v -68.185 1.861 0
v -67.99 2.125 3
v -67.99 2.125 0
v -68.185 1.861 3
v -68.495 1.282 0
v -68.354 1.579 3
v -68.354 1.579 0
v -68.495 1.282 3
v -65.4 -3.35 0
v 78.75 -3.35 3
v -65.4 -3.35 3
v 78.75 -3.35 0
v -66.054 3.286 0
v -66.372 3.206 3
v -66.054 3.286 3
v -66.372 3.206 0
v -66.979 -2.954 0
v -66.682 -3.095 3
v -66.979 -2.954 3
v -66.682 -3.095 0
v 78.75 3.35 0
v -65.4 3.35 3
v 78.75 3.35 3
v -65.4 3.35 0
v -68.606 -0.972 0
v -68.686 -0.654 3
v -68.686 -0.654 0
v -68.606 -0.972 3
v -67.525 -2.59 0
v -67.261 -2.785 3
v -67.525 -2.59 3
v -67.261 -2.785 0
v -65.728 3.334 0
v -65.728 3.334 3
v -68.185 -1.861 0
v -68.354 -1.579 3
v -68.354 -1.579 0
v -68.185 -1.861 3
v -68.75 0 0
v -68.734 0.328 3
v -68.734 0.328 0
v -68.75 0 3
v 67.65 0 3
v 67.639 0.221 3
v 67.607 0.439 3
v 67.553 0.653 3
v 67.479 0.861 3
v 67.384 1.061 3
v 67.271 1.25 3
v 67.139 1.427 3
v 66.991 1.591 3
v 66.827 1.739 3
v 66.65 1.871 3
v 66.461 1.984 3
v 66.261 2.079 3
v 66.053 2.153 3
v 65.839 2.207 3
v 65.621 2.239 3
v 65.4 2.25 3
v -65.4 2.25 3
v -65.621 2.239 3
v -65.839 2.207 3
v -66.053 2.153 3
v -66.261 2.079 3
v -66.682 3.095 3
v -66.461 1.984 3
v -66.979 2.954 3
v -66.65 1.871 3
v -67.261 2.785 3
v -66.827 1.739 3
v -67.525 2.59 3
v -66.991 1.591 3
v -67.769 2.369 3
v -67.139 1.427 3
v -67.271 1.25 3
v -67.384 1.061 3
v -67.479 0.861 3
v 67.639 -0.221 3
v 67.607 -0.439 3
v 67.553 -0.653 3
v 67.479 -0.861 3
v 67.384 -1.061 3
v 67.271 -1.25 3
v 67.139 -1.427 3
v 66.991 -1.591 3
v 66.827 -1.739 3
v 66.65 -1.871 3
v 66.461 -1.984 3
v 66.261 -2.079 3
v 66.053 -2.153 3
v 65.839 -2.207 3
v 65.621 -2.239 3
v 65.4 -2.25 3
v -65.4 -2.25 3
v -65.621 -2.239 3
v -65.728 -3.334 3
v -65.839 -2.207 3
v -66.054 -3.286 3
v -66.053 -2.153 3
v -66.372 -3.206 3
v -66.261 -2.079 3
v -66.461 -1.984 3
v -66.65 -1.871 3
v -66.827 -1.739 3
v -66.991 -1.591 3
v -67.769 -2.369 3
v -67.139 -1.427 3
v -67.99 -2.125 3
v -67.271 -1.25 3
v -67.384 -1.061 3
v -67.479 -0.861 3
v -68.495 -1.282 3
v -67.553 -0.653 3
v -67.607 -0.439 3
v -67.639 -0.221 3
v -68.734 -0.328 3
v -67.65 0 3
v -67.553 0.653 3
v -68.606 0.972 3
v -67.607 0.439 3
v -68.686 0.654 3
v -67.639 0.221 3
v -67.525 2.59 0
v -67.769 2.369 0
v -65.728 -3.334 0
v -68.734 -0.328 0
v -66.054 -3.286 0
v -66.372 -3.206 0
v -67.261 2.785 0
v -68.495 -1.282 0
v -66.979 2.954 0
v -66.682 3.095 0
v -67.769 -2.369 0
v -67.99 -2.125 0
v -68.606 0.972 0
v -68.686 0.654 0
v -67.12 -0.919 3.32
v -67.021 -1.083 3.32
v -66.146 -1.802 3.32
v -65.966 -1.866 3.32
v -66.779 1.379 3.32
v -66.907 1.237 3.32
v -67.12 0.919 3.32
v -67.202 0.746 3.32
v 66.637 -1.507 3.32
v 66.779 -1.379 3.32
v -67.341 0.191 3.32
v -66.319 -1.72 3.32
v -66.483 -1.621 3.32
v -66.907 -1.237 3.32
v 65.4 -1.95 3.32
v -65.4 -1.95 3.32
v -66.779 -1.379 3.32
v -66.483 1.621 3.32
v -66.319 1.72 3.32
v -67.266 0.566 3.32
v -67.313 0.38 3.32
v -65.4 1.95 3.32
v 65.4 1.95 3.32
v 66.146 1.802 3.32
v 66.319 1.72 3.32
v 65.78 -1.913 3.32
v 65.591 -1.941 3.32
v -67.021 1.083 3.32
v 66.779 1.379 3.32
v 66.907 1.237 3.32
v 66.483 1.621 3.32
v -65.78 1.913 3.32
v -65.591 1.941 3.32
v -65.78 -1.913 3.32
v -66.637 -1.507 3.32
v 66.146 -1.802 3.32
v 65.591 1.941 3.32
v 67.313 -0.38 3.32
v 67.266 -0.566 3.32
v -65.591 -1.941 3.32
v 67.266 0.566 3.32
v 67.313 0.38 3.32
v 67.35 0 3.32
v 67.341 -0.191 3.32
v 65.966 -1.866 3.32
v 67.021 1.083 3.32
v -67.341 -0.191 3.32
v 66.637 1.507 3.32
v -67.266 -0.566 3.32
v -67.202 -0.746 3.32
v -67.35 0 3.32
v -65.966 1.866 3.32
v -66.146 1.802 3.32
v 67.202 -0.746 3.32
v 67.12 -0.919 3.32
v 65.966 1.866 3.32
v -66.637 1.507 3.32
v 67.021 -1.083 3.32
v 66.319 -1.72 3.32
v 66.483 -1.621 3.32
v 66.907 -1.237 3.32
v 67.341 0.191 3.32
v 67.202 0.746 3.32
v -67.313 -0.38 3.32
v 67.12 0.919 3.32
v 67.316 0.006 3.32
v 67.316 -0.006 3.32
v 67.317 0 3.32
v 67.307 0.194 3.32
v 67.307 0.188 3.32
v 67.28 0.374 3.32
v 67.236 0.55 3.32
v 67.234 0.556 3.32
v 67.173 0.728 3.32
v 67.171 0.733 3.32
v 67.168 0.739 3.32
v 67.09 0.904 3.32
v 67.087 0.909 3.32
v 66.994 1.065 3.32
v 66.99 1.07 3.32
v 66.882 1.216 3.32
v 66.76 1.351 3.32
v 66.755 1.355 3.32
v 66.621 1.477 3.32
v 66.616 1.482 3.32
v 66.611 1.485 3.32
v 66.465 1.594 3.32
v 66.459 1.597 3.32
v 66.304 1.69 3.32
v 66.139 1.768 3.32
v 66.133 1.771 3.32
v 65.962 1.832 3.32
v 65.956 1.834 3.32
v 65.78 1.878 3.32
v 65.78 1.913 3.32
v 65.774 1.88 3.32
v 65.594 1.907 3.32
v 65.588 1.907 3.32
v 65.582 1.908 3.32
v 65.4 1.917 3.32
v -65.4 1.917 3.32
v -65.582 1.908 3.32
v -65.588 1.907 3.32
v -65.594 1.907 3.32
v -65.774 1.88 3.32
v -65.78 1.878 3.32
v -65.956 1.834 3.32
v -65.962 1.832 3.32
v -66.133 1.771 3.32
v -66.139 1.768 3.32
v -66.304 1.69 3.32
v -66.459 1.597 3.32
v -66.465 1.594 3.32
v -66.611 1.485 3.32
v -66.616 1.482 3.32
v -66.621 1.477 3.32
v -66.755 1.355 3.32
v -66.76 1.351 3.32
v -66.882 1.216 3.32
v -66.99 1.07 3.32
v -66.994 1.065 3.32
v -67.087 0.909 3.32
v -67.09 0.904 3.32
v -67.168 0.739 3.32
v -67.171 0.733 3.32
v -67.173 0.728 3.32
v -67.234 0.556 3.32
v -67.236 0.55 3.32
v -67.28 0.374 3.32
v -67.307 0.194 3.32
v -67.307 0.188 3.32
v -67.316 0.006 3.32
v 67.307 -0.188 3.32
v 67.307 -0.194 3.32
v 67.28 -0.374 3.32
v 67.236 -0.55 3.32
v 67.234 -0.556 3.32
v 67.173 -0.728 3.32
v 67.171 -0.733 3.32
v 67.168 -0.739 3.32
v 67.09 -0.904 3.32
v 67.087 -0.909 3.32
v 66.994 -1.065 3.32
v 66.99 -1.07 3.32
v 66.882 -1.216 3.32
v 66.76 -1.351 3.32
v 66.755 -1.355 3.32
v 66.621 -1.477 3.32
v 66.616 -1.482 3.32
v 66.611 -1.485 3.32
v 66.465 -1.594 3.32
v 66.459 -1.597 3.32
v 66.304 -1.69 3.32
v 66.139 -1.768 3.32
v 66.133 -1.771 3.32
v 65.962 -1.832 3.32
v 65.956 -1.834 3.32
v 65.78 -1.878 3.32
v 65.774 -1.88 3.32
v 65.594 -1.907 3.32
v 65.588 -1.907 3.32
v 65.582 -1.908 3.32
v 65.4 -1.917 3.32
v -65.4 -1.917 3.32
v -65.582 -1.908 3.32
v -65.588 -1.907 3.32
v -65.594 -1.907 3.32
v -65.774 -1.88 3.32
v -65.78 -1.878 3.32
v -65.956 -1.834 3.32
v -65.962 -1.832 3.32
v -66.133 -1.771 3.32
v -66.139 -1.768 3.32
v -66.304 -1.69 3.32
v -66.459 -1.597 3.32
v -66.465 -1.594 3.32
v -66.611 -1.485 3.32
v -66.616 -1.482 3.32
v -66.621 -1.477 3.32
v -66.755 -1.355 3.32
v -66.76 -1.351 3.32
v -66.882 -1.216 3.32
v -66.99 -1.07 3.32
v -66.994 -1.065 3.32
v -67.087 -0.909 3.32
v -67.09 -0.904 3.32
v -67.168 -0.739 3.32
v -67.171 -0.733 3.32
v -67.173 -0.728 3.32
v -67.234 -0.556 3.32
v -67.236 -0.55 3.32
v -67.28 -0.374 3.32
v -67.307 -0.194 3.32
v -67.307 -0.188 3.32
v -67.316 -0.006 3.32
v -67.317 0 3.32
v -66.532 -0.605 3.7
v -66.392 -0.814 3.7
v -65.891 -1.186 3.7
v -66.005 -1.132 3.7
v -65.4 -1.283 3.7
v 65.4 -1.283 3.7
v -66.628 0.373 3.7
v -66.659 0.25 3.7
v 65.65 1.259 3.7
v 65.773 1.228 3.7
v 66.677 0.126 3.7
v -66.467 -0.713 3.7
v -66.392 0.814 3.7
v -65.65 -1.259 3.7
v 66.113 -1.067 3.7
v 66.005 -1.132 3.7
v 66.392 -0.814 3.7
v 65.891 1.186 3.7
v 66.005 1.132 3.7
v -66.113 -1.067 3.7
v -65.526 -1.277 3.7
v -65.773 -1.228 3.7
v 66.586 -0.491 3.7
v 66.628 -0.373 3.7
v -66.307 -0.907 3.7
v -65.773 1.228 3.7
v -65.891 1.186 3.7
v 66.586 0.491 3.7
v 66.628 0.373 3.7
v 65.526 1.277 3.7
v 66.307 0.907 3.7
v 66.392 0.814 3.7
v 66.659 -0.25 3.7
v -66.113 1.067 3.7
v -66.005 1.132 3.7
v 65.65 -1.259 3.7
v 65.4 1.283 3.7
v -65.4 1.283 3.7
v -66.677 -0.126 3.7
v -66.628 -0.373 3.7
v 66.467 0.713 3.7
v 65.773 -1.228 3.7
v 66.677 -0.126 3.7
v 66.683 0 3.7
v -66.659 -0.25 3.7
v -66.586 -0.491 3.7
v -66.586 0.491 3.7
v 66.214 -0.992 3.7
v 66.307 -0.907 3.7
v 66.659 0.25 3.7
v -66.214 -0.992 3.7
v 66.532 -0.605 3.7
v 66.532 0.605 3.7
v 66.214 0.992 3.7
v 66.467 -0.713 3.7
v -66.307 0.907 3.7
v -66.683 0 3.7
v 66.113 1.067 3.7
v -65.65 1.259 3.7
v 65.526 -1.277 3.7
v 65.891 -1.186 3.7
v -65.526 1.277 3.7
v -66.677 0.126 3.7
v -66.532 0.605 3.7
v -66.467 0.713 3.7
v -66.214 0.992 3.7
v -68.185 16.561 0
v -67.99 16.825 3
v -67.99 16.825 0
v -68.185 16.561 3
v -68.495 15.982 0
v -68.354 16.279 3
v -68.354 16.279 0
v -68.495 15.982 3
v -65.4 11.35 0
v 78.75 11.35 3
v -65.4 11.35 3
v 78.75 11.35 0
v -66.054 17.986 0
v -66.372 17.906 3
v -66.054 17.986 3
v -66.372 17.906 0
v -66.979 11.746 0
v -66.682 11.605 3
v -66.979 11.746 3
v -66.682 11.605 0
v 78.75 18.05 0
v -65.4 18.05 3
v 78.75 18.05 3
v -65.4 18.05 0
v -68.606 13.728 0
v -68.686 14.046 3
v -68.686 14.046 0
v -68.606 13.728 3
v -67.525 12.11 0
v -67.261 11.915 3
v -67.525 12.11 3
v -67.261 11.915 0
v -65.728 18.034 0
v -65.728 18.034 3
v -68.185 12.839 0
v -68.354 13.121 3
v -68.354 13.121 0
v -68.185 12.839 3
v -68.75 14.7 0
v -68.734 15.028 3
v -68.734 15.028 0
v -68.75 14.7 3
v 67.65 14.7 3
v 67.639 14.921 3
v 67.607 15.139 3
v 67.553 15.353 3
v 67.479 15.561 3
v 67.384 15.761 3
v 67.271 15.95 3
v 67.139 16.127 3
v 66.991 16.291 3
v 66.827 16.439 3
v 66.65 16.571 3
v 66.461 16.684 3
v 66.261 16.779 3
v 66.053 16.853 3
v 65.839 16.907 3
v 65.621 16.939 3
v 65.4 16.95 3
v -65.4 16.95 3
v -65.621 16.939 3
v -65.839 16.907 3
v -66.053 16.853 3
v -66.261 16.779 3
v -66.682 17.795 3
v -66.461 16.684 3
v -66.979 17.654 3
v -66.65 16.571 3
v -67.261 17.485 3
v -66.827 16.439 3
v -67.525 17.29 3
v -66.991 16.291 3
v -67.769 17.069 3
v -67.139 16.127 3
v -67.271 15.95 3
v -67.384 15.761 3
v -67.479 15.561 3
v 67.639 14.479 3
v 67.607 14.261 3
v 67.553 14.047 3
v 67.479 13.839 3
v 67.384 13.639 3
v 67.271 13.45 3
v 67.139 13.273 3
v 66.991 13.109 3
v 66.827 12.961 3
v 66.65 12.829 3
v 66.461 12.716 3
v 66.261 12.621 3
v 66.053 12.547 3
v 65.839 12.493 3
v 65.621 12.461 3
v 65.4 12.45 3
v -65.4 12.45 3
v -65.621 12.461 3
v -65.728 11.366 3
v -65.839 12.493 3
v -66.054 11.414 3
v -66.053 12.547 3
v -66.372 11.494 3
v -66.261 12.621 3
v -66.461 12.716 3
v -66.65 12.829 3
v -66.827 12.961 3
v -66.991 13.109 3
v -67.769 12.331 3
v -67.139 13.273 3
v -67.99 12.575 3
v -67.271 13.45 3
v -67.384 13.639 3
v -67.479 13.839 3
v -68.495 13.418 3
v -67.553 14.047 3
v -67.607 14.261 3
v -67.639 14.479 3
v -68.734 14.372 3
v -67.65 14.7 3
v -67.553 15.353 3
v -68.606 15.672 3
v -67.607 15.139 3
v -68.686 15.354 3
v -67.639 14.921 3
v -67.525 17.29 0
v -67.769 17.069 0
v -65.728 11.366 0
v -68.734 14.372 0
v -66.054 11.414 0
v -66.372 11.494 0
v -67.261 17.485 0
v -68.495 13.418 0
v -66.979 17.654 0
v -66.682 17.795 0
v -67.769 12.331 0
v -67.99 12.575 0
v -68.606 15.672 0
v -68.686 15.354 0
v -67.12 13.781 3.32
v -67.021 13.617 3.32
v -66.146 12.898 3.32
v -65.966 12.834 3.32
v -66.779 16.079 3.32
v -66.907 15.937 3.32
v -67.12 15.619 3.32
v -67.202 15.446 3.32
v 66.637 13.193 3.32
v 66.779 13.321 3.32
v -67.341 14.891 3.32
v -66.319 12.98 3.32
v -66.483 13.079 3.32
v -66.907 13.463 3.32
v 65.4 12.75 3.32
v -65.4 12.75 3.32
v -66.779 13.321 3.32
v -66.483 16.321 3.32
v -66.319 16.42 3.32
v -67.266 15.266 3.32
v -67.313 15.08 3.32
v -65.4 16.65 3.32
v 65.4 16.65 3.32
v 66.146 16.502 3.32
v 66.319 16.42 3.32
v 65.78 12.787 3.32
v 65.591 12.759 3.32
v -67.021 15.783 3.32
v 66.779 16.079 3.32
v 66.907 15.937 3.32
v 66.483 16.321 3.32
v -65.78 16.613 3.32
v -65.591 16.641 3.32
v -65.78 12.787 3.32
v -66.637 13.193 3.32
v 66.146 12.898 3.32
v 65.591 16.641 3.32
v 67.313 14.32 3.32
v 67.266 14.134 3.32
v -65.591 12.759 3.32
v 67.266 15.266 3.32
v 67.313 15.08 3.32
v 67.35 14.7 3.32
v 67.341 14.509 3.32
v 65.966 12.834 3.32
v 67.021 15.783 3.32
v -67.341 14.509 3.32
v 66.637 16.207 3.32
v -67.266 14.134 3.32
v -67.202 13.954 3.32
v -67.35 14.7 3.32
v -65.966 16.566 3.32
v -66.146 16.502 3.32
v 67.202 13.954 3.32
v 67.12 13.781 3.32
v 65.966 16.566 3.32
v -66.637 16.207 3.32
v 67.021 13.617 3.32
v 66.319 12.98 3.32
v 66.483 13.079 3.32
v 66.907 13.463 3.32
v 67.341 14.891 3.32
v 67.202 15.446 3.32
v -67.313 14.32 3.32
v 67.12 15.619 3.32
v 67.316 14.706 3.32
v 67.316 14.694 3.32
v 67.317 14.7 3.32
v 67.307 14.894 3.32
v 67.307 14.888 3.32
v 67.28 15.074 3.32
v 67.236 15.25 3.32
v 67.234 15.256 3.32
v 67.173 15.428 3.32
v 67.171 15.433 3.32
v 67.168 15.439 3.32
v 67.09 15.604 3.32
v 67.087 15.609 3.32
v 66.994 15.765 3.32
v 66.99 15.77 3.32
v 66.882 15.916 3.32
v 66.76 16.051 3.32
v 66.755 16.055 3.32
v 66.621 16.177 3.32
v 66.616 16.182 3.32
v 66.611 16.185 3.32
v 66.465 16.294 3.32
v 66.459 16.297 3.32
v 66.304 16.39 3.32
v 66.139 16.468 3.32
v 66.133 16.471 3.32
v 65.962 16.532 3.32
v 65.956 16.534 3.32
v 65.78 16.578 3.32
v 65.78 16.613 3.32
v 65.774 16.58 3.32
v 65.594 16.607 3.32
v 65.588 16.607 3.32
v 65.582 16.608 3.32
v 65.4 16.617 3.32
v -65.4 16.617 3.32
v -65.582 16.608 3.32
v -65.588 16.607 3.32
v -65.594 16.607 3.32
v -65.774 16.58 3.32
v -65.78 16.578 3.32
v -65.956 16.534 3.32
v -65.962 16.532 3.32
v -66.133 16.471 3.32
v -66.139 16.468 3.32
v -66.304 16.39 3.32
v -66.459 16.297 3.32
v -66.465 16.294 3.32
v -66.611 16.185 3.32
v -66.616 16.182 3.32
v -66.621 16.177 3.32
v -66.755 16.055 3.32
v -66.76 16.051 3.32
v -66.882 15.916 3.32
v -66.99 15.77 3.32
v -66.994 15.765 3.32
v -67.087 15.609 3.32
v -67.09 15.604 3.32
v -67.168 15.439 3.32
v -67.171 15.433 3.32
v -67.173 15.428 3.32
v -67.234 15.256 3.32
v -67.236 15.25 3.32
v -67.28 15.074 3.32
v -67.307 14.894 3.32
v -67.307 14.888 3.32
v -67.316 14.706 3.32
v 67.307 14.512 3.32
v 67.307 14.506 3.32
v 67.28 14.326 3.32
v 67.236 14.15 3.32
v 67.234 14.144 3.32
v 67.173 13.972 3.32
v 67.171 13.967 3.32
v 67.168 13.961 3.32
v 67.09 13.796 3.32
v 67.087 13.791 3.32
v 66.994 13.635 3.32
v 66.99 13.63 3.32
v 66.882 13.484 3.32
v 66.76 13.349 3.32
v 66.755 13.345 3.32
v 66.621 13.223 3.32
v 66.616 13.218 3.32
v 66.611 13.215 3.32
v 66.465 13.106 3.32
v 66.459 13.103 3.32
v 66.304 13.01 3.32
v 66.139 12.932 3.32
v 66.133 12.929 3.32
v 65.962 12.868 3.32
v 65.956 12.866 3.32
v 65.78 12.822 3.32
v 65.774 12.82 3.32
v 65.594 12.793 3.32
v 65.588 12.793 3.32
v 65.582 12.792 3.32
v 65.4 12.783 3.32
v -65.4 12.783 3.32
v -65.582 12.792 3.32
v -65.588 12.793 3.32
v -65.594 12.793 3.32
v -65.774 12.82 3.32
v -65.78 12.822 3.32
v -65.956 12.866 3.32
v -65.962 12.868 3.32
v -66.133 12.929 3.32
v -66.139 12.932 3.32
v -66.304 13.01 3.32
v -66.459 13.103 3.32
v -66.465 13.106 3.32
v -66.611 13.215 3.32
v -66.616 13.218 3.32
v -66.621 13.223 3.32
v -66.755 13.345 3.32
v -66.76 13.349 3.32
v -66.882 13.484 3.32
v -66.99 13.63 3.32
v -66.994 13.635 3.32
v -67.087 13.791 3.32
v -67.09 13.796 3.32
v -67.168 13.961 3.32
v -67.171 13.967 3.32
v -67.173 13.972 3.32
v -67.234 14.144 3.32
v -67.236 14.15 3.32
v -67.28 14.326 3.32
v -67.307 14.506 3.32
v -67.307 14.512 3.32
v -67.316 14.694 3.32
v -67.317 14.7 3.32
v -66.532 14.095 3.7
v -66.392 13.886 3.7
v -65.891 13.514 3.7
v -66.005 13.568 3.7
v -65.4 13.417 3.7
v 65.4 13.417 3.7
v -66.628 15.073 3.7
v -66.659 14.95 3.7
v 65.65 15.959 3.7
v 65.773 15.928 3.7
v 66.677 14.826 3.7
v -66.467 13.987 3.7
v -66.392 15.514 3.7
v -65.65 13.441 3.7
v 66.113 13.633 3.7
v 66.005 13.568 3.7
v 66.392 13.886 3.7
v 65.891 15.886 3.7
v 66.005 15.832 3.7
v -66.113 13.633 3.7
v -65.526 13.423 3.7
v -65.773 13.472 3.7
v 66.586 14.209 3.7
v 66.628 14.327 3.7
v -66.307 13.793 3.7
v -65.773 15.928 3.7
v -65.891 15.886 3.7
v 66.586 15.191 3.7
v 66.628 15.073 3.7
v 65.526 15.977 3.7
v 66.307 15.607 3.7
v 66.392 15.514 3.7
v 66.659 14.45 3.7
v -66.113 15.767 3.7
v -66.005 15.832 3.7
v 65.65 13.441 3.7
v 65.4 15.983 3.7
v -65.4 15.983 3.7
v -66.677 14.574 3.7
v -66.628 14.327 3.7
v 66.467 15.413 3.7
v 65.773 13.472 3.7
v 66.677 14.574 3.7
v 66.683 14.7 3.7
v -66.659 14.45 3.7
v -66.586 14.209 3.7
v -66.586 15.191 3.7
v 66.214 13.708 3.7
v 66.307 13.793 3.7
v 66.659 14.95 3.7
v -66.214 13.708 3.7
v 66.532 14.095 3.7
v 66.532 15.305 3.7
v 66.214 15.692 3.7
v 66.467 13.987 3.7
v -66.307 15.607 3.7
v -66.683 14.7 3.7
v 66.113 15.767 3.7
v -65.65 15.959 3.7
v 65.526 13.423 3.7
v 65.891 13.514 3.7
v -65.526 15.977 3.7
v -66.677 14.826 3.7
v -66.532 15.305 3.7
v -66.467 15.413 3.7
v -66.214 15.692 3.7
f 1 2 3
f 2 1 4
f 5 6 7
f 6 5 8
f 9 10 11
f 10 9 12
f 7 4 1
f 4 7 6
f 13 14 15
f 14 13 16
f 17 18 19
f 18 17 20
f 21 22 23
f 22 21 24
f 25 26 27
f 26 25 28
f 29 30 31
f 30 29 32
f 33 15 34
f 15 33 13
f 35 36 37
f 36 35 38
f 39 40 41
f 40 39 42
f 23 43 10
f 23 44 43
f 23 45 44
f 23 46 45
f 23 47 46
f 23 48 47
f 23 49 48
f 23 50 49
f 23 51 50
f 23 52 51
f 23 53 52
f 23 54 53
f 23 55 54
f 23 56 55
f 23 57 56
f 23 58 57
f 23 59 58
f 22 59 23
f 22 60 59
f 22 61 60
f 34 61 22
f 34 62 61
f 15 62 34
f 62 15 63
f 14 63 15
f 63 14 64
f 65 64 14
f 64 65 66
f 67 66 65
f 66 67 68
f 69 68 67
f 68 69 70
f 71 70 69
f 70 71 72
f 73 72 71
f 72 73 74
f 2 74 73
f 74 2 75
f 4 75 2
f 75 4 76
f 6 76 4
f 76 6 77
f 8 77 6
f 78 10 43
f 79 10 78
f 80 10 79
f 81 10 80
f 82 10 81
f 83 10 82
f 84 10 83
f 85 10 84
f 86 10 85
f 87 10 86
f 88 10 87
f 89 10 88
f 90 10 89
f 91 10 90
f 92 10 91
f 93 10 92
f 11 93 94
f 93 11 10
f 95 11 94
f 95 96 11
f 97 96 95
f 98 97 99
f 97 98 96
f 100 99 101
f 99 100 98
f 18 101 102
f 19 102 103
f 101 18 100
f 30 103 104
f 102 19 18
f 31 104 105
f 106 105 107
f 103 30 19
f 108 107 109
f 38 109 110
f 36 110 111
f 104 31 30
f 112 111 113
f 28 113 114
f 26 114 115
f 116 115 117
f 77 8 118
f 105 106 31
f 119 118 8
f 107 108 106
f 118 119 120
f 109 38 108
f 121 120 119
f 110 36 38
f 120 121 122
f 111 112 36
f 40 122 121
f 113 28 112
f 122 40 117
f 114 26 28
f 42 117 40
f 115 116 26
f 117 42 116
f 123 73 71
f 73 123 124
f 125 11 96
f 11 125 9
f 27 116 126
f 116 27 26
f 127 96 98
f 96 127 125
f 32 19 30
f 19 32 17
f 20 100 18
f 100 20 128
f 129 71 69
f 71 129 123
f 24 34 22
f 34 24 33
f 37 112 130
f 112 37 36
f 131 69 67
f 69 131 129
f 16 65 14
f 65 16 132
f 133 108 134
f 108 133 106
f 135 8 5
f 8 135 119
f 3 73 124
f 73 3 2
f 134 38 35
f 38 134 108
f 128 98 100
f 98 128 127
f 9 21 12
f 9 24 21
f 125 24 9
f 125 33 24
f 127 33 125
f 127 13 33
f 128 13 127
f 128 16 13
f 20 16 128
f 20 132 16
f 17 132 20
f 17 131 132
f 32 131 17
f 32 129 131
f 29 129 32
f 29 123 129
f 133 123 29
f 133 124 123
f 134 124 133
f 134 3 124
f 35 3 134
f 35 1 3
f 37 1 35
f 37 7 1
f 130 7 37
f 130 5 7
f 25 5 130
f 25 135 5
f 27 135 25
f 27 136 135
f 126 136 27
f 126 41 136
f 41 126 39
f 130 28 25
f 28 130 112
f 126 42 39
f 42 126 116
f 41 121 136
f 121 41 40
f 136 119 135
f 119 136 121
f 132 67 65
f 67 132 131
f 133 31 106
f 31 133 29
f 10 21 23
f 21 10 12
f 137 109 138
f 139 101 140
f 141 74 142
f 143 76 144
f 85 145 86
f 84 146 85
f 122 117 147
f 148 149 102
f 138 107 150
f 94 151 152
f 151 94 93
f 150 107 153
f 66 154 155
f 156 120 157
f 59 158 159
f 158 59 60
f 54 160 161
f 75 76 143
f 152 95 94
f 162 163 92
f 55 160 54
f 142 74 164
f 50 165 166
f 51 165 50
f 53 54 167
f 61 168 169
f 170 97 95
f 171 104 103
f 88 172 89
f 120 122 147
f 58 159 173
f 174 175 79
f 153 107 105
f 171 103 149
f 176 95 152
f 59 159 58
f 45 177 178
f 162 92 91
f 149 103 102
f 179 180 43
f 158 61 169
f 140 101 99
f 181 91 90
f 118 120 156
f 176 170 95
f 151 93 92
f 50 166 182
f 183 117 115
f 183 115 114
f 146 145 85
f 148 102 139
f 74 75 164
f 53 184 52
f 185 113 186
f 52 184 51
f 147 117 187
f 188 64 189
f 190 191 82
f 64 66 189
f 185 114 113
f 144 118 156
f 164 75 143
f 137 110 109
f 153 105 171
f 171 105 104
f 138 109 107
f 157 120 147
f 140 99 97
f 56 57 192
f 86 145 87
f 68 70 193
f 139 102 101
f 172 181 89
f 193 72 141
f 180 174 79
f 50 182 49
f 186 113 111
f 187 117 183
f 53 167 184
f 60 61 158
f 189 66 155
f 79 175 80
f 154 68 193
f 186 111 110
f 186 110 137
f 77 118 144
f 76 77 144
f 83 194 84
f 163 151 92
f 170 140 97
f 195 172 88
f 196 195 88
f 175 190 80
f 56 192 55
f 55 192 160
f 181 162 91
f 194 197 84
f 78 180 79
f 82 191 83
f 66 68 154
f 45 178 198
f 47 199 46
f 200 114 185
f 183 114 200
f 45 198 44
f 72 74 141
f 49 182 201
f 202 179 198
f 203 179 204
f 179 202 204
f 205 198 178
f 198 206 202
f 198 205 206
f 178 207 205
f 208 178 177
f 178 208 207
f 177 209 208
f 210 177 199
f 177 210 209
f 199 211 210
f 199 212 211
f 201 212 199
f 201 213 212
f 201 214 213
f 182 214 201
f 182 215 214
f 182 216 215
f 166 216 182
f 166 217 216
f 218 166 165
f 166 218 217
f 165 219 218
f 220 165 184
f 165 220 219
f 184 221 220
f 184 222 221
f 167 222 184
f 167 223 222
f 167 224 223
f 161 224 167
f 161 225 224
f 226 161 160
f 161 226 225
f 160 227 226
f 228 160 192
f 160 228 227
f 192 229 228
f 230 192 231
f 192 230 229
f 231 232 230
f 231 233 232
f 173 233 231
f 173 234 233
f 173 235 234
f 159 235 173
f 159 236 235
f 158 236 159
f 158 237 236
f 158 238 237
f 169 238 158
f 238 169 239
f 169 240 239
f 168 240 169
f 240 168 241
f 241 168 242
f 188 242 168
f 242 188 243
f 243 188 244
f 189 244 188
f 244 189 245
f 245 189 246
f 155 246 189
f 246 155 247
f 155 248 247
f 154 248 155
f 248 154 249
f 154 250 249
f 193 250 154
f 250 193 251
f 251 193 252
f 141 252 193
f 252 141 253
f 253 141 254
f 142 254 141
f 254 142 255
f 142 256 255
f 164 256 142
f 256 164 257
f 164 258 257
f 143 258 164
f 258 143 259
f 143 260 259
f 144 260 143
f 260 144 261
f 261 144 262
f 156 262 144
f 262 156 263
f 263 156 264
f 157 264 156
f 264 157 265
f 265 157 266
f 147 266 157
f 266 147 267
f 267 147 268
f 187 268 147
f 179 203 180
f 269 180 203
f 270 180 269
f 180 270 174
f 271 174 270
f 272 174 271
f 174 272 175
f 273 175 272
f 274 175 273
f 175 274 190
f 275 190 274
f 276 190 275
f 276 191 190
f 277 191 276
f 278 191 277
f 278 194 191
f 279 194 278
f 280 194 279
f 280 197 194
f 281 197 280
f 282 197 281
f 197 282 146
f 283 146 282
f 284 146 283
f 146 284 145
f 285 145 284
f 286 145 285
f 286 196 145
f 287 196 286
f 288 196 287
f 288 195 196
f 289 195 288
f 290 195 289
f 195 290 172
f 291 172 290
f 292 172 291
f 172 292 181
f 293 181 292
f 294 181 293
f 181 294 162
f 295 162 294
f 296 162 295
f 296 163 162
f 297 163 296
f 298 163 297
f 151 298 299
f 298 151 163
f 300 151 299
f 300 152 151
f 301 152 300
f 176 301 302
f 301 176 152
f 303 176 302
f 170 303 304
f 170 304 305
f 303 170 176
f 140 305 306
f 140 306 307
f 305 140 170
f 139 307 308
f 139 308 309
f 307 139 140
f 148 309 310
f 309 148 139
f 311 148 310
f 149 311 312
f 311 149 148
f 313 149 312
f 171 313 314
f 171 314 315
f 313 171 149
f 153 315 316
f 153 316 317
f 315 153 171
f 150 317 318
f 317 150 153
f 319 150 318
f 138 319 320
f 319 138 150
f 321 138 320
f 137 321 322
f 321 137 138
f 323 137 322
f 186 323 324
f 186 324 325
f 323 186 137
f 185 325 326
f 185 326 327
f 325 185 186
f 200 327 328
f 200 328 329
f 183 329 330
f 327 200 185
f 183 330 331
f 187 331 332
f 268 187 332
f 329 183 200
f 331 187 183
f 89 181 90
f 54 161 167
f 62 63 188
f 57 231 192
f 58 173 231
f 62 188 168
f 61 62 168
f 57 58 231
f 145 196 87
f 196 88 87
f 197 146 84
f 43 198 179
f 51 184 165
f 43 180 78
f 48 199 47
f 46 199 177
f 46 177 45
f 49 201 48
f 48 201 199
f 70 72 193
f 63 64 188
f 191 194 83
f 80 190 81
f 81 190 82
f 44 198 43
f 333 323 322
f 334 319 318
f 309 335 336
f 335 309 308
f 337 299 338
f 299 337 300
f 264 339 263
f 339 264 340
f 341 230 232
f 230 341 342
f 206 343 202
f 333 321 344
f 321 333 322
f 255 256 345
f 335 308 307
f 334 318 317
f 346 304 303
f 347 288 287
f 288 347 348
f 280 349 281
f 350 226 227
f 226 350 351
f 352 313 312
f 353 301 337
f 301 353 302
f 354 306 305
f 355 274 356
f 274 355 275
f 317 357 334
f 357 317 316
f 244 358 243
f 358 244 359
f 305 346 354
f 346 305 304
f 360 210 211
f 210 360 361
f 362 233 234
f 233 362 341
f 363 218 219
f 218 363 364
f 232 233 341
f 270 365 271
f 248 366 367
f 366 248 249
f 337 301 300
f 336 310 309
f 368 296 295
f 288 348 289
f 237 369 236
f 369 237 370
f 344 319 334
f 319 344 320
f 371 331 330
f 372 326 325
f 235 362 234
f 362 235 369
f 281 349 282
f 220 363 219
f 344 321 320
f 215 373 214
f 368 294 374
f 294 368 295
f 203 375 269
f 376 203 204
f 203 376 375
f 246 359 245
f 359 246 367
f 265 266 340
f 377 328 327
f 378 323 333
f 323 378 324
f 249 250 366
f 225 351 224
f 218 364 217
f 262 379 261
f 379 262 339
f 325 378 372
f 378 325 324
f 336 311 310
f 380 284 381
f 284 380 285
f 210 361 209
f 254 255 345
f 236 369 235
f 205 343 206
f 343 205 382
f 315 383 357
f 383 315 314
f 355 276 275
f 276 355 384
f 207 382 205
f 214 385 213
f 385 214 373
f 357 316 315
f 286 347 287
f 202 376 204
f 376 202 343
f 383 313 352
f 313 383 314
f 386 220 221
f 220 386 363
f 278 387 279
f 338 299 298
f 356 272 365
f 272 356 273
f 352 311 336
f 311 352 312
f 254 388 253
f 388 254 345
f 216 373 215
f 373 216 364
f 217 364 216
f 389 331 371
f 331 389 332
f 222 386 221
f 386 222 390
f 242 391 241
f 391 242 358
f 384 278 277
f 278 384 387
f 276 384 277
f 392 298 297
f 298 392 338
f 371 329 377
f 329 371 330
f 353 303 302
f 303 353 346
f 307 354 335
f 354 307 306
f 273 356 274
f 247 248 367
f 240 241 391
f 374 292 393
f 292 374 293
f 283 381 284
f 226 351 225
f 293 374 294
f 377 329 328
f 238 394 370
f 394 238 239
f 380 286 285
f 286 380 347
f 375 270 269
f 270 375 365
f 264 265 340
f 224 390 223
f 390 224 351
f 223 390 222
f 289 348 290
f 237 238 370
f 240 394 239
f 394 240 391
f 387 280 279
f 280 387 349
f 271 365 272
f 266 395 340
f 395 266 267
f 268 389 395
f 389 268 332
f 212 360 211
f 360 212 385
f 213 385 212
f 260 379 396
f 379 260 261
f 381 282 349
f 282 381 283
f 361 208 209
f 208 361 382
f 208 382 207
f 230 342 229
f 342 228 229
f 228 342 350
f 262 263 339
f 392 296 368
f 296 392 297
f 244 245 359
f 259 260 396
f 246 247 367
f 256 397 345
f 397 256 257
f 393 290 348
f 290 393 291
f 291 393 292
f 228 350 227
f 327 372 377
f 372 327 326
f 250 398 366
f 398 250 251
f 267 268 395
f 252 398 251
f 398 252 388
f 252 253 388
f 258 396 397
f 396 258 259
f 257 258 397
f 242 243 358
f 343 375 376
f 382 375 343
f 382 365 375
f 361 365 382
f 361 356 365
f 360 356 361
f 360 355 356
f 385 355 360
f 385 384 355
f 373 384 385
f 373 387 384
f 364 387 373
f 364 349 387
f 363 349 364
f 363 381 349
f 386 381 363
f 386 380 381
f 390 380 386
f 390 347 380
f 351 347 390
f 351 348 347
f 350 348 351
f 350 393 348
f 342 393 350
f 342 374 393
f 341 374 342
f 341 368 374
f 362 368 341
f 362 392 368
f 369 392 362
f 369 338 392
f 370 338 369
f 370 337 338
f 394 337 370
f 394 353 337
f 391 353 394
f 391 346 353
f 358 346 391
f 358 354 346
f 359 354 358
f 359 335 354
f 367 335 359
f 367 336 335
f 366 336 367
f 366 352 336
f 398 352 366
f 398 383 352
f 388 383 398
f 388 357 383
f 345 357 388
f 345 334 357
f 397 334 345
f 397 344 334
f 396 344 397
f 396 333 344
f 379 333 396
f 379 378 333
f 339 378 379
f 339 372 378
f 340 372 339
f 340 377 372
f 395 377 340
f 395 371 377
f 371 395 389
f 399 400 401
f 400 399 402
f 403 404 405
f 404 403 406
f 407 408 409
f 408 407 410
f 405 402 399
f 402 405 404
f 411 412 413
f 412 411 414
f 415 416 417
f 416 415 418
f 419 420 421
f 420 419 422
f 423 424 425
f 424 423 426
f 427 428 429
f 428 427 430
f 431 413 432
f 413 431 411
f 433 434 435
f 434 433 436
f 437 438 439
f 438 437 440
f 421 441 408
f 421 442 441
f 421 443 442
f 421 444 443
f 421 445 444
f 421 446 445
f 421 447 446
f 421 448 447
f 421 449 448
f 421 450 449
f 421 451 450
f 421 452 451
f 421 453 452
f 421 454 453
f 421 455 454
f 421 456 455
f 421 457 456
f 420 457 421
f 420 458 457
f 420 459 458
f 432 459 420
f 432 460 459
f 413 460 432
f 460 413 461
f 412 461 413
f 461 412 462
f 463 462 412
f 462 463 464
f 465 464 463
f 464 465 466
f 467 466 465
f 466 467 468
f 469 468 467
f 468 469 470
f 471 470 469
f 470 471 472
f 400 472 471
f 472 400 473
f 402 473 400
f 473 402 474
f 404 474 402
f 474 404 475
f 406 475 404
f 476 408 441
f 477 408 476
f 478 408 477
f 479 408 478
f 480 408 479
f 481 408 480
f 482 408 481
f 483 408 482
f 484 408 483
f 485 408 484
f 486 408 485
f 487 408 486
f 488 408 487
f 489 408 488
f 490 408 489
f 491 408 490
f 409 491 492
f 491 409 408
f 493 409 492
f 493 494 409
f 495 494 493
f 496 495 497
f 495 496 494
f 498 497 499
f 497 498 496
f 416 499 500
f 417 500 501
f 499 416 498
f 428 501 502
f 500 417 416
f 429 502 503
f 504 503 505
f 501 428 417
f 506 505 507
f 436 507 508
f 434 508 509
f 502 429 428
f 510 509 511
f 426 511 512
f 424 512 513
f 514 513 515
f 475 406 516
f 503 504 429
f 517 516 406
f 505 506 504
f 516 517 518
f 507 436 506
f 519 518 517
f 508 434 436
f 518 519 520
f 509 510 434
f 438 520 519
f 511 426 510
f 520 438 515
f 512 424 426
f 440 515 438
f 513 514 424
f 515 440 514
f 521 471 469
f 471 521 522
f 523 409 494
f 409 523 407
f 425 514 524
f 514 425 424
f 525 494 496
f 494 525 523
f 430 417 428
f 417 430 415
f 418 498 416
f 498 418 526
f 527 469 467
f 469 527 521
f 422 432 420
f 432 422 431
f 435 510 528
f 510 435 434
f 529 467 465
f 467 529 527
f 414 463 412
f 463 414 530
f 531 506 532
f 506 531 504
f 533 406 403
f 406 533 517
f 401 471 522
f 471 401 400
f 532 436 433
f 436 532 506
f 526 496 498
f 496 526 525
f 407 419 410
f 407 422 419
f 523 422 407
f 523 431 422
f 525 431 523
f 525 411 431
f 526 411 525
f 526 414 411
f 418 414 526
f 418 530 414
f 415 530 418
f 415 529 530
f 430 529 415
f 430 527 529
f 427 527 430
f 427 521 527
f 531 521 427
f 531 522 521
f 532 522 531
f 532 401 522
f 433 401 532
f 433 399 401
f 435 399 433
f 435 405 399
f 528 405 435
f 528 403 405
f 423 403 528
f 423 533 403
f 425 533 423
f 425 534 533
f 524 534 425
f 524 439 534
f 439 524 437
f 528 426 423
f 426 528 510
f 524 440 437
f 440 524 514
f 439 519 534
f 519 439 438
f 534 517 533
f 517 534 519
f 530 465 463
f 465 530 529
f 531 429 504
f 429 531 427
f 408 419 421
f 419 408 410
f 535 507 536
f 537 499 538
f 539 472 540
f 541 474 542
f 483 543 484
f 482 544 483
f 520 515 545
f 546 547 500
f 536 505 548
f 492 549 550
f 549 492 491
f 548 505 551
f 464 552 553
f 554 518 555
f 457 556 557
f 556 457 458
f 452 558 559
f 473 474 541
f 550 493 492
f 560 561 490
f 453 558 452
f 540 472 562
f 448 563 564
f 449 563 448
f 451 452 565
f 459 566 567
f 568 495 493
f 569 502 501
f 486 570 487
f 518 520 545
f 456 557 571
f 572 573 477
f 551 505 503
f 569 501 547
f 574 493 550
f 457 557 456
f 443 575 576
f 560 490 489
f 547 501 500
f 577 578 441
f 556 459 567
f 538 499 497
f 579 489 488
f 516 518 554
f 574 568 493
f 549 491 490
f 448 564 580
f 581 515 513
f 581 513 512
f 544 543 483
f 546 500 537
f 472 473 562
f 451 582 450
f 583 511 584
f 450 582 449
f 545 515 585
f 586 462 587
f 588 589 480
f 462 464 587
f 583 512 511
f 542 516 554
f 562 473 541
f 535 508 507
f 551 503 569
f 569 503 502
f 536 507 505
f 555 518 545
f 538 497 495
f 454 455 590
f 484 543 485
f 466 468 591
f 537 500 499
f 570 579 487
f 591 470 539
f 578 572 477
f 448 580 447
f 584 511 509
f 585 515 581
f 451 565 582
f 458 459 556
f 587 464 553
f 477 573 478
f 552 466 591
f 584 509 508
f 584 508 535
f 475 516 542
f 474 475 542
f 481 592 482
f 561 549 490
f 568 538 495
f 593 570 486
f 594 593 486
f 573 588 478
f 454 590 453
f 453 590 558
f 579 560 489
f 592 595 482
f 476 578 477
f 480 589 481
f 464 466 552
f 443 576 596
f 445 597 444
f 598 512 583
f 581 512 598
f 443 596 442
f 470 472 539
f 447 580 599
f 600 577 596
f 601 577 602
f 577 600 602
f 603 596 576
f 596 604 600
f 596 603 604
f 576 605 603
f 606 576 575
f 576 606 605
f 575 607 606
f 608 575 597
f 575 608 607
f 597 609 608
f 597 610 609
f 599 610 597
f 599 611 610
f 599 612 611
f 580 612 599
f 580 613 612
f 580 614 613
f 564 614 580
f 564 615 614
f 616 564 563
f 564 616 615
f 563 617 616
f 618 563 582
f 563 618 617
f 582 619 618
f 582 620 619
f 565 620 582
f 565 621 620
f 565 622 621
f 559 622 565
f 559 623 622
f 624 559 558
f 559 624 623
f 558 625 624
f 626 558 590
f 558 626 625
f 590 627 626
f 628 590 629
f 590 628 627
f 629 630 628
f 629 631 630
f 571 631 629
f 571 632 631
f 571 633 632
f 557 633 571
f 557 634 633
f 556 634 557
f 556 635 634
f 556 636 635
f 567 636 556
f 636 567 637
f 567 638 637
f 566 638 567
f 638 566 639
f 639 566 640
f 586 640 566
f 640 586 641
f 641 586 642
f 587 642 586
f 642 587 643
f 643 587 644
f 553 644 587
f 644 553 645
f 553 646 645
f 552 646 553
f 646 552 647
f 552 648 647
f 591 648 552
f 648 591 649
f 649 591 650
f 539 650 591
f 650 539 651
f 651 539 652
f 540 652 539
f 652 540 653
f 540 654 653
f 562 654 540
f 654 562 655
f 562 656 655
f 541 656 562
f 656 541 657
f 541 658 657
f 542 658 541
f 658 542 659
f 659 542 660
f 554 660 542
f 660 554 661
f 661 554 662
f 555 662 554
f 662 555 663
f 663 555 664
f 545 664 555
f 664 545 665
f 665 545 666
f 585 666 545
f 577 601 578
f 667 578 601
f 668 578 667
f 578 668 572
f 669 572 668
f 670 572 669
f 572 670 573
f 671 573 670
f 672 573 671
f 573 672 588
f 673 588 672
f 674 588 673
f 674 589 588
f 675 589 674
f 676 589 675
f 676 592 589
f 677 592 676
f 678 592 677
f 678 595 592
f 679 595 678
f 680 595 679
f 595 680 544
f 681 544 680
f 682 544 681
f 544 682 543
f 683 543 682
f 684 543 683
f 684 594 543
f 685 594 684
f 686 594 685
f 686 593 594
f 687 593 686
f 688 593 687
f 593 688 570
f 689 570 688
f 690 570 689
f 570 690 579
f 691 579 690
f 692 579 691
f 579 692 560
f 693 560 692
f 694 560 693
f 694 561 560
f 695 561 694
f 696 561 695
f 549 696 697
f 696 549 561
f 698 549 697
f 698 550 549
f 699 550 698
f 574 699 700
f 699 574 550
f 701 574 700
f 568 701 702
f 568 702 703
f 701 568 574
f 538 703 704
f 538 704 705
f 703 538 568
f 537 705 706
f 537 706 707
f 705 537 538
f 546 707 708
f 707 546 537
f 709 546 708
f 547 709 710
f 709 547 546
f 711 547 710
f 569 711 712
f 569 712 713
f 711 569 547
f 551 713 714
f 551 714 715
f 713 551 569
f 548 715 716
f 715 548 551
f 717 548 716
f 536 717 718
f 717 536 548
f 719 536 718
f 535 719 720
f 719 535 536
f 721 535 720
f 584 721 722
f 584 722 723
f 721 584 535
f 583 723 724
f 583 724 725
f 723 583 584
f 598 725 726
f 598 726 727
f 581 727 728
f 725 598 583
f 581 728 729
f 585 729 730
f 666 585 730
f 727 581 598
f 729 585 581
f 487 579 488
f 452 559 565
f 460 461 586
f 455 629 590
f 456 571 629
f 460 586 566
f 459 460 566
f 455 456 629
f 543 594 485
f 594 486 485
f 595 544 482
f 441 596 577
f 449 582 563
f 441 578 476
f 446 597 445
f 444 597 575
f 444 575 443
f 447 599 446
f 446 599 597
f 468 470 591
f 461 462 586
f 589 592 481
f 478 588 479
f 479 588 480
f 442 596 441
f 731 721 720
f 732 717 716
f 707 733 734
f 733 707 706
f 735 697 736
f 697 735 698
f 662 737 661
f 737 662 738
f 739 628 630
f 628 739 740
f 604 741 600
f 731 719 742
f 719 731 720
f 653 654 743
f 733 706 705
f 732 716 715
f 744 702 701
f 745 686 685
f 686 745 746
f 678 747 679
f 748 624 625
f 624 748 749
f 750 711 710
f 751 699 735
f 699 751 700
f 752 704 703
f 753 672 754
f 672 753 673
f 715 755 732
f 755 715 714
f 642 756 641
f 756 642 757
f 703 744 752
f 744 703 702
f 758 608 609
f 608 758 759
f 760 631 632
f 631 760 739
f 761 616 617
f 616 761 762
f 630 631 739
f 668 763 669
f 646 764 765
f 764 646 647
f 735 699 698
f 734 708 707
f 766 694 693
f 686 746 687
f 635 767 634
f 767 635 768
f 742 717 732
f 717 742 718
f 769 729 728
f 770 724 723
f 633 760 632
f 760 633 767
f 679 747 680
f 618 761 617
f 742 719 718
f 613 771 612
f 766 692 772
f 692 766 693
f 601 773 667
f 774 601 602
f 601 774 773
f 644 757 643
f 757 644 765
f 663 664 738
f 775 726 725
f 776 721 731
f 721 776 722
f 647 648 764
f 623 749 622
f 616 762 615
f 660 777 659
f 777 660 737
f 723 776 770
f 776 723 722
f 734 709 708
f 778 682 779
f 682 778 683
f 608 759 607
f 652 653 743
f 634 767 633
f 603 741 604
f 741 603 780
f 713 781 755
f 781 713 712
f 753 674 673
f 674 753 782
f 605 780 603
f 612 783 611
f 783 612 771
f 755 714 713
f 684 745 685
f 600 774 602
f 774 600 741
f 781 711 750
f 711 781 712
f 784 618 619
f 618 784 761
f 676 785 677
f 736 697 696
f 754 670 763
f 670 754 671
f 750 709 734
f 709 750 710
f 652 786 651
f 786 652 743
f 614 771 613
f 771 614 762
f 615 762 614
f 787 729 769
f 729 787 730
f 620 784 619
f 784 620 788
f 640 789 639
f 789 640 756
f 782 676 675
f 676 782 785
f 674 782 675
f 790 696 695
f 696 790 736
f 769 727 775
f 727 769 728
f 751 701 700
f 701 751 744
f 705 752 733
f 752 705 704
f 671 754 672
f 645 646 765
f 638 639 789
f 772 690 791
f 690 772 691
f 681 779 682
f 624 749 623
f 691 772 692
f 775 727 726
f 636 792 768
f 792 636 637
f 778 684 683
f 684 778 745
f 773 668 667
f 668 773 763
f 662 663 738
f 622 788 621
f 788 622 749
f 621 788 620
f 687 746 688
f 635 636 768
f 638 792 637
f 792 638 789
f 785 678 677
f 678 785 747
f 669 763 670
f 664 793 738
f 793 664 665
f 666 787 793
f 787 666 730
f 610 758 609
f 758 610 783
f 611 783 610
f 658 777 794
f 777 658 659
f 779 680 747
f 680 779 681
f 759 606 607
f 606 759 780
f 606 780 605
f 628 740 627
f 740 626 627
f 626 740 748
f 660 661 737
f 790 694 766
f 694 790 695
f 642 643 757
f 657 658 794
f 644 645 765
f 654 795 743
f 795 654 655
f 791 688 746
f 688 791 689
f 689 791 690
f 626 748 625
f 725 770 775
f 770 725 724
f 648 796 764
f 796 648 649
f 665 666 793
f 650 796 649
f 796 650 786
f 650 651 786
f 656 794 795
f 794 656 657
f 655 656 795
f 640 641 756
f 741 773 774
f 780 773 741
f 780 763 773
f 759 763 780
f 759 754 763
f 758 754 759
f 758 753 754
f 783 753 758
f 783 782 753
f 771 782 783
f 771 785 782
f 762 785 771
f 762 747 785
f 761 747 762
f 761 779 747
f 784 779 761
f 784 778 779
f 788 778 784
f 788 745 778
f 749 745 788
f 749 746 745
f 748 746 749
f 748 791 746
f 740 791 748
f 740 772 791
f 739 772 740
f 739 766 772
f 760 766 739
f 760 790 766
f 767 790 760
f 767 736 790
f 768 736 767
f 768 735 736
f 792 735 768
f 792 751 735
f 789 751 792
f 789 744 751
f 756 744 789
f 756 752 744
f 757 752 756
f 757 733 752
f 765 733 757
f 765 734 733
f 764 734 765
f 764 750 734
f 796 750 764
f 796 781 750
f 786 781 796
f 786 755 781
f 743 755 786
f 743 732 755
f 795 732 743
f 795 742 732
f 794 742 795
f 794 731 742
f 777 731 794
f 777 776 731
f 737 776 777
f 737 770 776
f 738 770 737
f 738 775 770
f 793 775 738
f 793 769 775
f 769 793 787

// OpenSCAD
// file: lib/volume.scad
// Liquid capacity in mm3, including the tapered chamber roof and the inlet.
// The rounded bath is analytic. Integrate the inlet's horizontal sections,
// subtracting their overlap with the main bath exactly once.
function rounded_bath_volume(w, d, r, h) =
    (w * d - (4 - PI) * r * r) * (h - r) +
    (w - 2 * r) * (d - 2 * r) * r +
    (w + d - 4 * r) * PI * r * r / 2 + 2 * PI * r * r * r / 3;

function interpolate(a, b, t) = a + (b - a) * t;
function roof_fraction(z) = min(1, max(0, (z - shoulder_z) / entry_slope_height));
function roof_area(z) =
    let(t = roof_fraction(z), w = interpolate(inner_width - 2 * floor_round, entry_straight, t),
        d = interpolate(slot_gap - 2 * floor_round, 0, t), r = interpolate(floor_round, slit_radius, t))
    w * d + 2 * r * (w + d) + PI * r * r;
function bath_volume(level) =
    rounded_bath_volume(inner_width, slot_gap, floor_round, min(level, shoulder_z) - floor_z) +
    (level <= shoulder_z ? 0 : (level - shoulder_z) / 6 *
        (roof_area(shoulder_z) + 4 * roof_area((shoulder_z + level) / 2) + roof_area(level)));
function bath_front_y(z) = wall_thickness + roof_fraction(z) * (slot_gap - paper_slit_width) / 2;
function paper_displacement(level) = paper_width * paper_thickness *
    min(paper_height, max(0, level - paper_bottom_z));
function liquid_capacity(level) = bath_volume(level) + (inlets_enabled ? inlet_fill_volume(level) : 0);

// Circular section outside the bath's front wall. The overlap with the bath
// is excluded, so the same liquid is never counted twice.
function circle_below_y(r, y) = y <= -r ? 0 : y >= r ? PI * r * r :
    r * r * (90 + asin(y / r)) * PI / 180 + y * sqrt(max(0, r * r - y * y));
function inlet_area_at(z, cy, r) = circle_below_y(r, bath_front_y(z) - cy);
function inlet_interval_volume(a, b, level, steps = 8) =
    level <= a[0] ? 0 :
    let(top = min(level, b[0]), dz = (top - a[0]) / steps)
    dz * sum_values([for (i = [0 : steps - 1])
        let(z = a[0] + (i + 0.5) * dz, t = (z - a[0]) / (b[0] - a[0]))
        inlet_area_at(z, interpolate(a[1], b[1], t), interpolate(a[2], b[2], t))]);
function sum_values(v, i = 0) = i == len(v) ? 0 : v[i] + sum_values(v, i + 1);
function inlet_fill_volume(level = fill_z) = sum_values([
    for (i = [0 : len(inlet_stations) - 2])
        inlet_interval_volume(inlet_stations[i], inlet_stations[i + 1], level)]);
// Volume of the shallow bowl pool above the start of the flare.
function inlet_bowl_volume(level) = sum_values([
    for (i = [inlet_path_steps : len(inlet_stations) - 2])
        inlet_interval_volume(inlet_stations[i], inlet_stations[i + 1], level)]);
function level_for_volume(volume, loaded = false,
        lo = floor_z + floor_round, hi = max_fill_z, iterations = 22) =
    iterations == 0 ? (lo + hi) / 2 :
    let(mid = (lo + hi) / 2,
        capacity = liquid_capacity(mid) - (loaded ? paper_displacement(mid) : 0))
    capacity < volume ? level_for_volume(volume, loaded, mid, hi, iterations - 1) :
        level_for_volume(volume, loaded, lo, mid, iterations - 1);

function greatest_common_divisor(a, b) = b == 0 ? a : greatest_common_divisor(b, a % b);
function rounded_working_ml(volume, parts, max_adjustment, max_volume = 1e99, min_volume = 0) =
    let(batch = (parts[0] + parts[1]) / greatest_common_divisor(parts[0], parts[1]),
        candidate = round(volume / batch) * batch)
    abs(candidate - volume) <= max_adjustment && candidate <= max_volume && candidate >= min_volume ? candidate :
        max(ceil(min_volume), min(round(volume), floor(max_volume)));
function whole_mix_ml(total, parts) =
    let(first = round(total * parts[0] / (parts[0] + parts[1]))) [first, total - first];
// file: lib/inlet.scad
// One continuous loft from the visible fill bowl into the chamber.
// Every horizontal section is round. The bend eases from vertical to a 45°
// descending bore, keeping the inside roof printable without trapped supports.
function smoothstep(t) = t * t * (3 - 2 * t);
function inlet_run(drop) = drop < inlet_bend_height ?
    drop * drop / (2 * inlet_bend_height) : drop - inlet_bend_height / 2;
function inlet_station(z) = z <= pool_z ?
    [z, -inlet_offset + inlet_run(pool_z - z), inlet_bore_diameter / 2] :
    [z, -inlet_offset, inlet_bore_diameter / 2 +
        (inlet_opening_diameter - inlet_bore_diameter) / 2 *
        smoothstep(min(1, (z - pool_z) / inlet_funnel_height))];
// Shared stations make the volume integral follow the actual faceted loft.
inlet_stations = concat(
    [for (i = [0 : inlet_path_steps]) inlet_station(inlet_exit_z +
        (pool_z - inlet_exit_z) * i / inlet_path_steps)],
    [for (i = [1 : inlet_funnel_steps]) inlet_station(pool_z +
        inlet_funnel_height * i / inlet_funnel_steps)],
    [[inlet_top_z, -inlet_offset, inlet_opening_diameter / 2]]);
function inlet_section(z, i = 0) =
    z <= inlet_stations[0][0] ? [inlet_stations[0][1], inlet_stations[0][2]] :
    i >= len(inlet_stations) - 2 || z <= inlet_stations[i + 1][0] ?
        let(a = inlet_stations[i], b = inlet_stations[i + 1],
            t = min(1, max(0, (z - a[0]) / (b[0] - a[0]))))
        [a[1] + t * (b[1] - a[1]), a[2] + t * (b[2] - a[2])] :
    inlet_section(z, i + 1);
function inlet_shell(z) = inlet_wall + (inlet_wall_top - inlet_wall) *
    smoothstep(min(1, max(0, (z - pool_z) / inlet_funnel_height)));

module inlet_loft(shell = false) {
    n = $fn;
    points = [for (s = inlet_stations) for (j = [0 : n - 1])
        let(r = s[2] + (shell ? inlet_shell(s[0]) : 0), a = j * 360 / n)
        [r * cos(a), s[1] + r * sin(a), s[0] + (!shell && s[0] == inlet_top_z ? eps : 0)]];
    // OpenSCAD polyhedron faces use clockwise order viewed from outside.
    faces = concat([[for (j = [0 : n - 1]) j]],
        [for (i = [0 : len(inlet_stations) - 2]) for (j = [0 : n - 1])
            [i * n + j, (i + 1) * n + j,
                (i + 1) * n + (j + 1) % n, i * n + (j + 1) % n]],
        [[for (j = [n - 1 : -1 : 0]) (len(inlet_stations) - 1) * n + j]]);
    // End fully inside the bath, never cut into the opposite wall/divider.
    intersection() {
        polyhedron(points, faces, convexity = 10);
        translate([-inlet_opening_diameter, -inlet_offset - inlet_outer_radius - 1, inlet_exit_z - 1])
            cube([2 * inlet_opening_diameter,
                inlet_offset + inlet_outer_radius + 1 + wall_thickness + min(2, slot_gap / 2),
                inlet_top_z - inlet_exit_z + 2]);
    }
}
// file: lib/caps.scad
// Print broad OUTSIDE faces on the bed, plugs up; flip for use. No supported handles.
module slit_cap() {
    union() {
        hull() for (x = [-entry_straight / 2, entry_straight / 2])
            translate([x, 0, 0]) cylinder(h = cap_lid_thickness, r = slit_cap_radius);
        translate([entry_straight / 2, -slit_lid_width / 2, 0])
            cube([slit_cap_radius + cap_tab_length, slit_lid_width, cap_lid_thickness]);
        // Match the actual entry's capsule ends and taper, inset on all sides.
        hull() {
            capsule_slice(-entry_straight / 2, entry_straight / 2, 0,
                cap_lid_thickness - eps, mouth_radius - cap_clearance);
            capsule_slice(-entry_straight / 2, entry_straight / 2, 0,
                cap_lid_thickness + top_round, entry_mouth_width / 2 - cap_clearance);
        }
        hull() {
            capsule_slice(-entry_straight / 2, entry_straight / 2, 0,
                cap_lid_thickness + top_round - eps, entry_mouth_width / 2 - cap_clearance);
            capsule_slice(-entry_straight / 2, entry_straight / 2, 0,
                cap_lid_thickness + slit_cap_rib_depth - eps,
                entry_radius_at_depth(slit_cap_rib_depth) - cap_clearance);
        }
    }
}
module inlet_cap() {
    r = inlet_opening_diameter / 2 - cap_clearance;
    chamfer = min(1, inlet_plug_length / 3);
    union() {
        cylinder(h = cap_lid_thickness, r = inlet_cap_radius);
        hull() for (y = [inlet_cap_radius - 5, inlet_cap_radius + cap_tab_length - 5])
            translate([0, y, 0]) cylinder(h = cap_lid_thickness, r = 5);
        translate([0, 0, cap_lid_thickness - eps])
            cylinder(h = inlet_plug_length - chamfer + eps, r = r);
        translate([0, 0, cap_lid_thickness + inlet_plug_length - chamfer])
            cylinder(h = chamfer, r1 = r, r2 = r - chamfer);
    }
}
module installed_slit_cap(i) {
    translate([outer_width / 2, slot_yc(i), outer_height + cap_lid_thickness])
        rotate([180, 0, i == 0 ? 0 : 180]) slit_cap();
}
module installed_inlet_cap(i) {
    inlet_frame(i) translate([0, -inlet_offset, inlet_top_z + cap_lid_thickness])
        rotate([180, 0, 0]) inlet_cap();
}
module slit_cap_plate() {
    for (i = [0 : chamber_count - 1])
        translate([0, i * (slit_lid_width + plate_gap), 0]) slit_cap();
}
module inlet_cap_plate() {
    for (i = [0 : chamber_count - 1])
        translate([i * (2 * inlet_cap_radius + plate_gap), 0, 0]) inlet_cap();
}
// file: lib/geometry.scad
// Helpers use dimensions loaded by parameters.scad.
module capsule_slice(x1, x2, yc, z, r) {
    hull() for (x = [x1, x2]) translate([x, yc, z]) cylinder(h = eps, r = r);
}
module rounded_rect_slice(x0, y0, w, d, z, r) {
    hull() for (x = [x0 + r, x0 + w - r]) for (y = [y0 + r, y0 + d - r])
        translate([x, y, z]) cylinder(h = eps, r = r);
}
module inlet_frame(i) {
    translate([outer_width / 2, i == 0 ? 0 : outer_depth, 0])
        rotate([0, 0, i == 0 ? 0 : 180]) children();
}
module entry_slice(i, z, r) {
    capsule_slice(entry_centres[0], entry_centres[1], slot_yc(i), z, r);
}
// main file
// Complete set of slot covers: flat outside faces on bed, locating ribs up.
include <lib/parameters.scad>
include <lib/geometry.scad>
include <lib/caps.scad>
validate_parameters() slit_cap_plate();
